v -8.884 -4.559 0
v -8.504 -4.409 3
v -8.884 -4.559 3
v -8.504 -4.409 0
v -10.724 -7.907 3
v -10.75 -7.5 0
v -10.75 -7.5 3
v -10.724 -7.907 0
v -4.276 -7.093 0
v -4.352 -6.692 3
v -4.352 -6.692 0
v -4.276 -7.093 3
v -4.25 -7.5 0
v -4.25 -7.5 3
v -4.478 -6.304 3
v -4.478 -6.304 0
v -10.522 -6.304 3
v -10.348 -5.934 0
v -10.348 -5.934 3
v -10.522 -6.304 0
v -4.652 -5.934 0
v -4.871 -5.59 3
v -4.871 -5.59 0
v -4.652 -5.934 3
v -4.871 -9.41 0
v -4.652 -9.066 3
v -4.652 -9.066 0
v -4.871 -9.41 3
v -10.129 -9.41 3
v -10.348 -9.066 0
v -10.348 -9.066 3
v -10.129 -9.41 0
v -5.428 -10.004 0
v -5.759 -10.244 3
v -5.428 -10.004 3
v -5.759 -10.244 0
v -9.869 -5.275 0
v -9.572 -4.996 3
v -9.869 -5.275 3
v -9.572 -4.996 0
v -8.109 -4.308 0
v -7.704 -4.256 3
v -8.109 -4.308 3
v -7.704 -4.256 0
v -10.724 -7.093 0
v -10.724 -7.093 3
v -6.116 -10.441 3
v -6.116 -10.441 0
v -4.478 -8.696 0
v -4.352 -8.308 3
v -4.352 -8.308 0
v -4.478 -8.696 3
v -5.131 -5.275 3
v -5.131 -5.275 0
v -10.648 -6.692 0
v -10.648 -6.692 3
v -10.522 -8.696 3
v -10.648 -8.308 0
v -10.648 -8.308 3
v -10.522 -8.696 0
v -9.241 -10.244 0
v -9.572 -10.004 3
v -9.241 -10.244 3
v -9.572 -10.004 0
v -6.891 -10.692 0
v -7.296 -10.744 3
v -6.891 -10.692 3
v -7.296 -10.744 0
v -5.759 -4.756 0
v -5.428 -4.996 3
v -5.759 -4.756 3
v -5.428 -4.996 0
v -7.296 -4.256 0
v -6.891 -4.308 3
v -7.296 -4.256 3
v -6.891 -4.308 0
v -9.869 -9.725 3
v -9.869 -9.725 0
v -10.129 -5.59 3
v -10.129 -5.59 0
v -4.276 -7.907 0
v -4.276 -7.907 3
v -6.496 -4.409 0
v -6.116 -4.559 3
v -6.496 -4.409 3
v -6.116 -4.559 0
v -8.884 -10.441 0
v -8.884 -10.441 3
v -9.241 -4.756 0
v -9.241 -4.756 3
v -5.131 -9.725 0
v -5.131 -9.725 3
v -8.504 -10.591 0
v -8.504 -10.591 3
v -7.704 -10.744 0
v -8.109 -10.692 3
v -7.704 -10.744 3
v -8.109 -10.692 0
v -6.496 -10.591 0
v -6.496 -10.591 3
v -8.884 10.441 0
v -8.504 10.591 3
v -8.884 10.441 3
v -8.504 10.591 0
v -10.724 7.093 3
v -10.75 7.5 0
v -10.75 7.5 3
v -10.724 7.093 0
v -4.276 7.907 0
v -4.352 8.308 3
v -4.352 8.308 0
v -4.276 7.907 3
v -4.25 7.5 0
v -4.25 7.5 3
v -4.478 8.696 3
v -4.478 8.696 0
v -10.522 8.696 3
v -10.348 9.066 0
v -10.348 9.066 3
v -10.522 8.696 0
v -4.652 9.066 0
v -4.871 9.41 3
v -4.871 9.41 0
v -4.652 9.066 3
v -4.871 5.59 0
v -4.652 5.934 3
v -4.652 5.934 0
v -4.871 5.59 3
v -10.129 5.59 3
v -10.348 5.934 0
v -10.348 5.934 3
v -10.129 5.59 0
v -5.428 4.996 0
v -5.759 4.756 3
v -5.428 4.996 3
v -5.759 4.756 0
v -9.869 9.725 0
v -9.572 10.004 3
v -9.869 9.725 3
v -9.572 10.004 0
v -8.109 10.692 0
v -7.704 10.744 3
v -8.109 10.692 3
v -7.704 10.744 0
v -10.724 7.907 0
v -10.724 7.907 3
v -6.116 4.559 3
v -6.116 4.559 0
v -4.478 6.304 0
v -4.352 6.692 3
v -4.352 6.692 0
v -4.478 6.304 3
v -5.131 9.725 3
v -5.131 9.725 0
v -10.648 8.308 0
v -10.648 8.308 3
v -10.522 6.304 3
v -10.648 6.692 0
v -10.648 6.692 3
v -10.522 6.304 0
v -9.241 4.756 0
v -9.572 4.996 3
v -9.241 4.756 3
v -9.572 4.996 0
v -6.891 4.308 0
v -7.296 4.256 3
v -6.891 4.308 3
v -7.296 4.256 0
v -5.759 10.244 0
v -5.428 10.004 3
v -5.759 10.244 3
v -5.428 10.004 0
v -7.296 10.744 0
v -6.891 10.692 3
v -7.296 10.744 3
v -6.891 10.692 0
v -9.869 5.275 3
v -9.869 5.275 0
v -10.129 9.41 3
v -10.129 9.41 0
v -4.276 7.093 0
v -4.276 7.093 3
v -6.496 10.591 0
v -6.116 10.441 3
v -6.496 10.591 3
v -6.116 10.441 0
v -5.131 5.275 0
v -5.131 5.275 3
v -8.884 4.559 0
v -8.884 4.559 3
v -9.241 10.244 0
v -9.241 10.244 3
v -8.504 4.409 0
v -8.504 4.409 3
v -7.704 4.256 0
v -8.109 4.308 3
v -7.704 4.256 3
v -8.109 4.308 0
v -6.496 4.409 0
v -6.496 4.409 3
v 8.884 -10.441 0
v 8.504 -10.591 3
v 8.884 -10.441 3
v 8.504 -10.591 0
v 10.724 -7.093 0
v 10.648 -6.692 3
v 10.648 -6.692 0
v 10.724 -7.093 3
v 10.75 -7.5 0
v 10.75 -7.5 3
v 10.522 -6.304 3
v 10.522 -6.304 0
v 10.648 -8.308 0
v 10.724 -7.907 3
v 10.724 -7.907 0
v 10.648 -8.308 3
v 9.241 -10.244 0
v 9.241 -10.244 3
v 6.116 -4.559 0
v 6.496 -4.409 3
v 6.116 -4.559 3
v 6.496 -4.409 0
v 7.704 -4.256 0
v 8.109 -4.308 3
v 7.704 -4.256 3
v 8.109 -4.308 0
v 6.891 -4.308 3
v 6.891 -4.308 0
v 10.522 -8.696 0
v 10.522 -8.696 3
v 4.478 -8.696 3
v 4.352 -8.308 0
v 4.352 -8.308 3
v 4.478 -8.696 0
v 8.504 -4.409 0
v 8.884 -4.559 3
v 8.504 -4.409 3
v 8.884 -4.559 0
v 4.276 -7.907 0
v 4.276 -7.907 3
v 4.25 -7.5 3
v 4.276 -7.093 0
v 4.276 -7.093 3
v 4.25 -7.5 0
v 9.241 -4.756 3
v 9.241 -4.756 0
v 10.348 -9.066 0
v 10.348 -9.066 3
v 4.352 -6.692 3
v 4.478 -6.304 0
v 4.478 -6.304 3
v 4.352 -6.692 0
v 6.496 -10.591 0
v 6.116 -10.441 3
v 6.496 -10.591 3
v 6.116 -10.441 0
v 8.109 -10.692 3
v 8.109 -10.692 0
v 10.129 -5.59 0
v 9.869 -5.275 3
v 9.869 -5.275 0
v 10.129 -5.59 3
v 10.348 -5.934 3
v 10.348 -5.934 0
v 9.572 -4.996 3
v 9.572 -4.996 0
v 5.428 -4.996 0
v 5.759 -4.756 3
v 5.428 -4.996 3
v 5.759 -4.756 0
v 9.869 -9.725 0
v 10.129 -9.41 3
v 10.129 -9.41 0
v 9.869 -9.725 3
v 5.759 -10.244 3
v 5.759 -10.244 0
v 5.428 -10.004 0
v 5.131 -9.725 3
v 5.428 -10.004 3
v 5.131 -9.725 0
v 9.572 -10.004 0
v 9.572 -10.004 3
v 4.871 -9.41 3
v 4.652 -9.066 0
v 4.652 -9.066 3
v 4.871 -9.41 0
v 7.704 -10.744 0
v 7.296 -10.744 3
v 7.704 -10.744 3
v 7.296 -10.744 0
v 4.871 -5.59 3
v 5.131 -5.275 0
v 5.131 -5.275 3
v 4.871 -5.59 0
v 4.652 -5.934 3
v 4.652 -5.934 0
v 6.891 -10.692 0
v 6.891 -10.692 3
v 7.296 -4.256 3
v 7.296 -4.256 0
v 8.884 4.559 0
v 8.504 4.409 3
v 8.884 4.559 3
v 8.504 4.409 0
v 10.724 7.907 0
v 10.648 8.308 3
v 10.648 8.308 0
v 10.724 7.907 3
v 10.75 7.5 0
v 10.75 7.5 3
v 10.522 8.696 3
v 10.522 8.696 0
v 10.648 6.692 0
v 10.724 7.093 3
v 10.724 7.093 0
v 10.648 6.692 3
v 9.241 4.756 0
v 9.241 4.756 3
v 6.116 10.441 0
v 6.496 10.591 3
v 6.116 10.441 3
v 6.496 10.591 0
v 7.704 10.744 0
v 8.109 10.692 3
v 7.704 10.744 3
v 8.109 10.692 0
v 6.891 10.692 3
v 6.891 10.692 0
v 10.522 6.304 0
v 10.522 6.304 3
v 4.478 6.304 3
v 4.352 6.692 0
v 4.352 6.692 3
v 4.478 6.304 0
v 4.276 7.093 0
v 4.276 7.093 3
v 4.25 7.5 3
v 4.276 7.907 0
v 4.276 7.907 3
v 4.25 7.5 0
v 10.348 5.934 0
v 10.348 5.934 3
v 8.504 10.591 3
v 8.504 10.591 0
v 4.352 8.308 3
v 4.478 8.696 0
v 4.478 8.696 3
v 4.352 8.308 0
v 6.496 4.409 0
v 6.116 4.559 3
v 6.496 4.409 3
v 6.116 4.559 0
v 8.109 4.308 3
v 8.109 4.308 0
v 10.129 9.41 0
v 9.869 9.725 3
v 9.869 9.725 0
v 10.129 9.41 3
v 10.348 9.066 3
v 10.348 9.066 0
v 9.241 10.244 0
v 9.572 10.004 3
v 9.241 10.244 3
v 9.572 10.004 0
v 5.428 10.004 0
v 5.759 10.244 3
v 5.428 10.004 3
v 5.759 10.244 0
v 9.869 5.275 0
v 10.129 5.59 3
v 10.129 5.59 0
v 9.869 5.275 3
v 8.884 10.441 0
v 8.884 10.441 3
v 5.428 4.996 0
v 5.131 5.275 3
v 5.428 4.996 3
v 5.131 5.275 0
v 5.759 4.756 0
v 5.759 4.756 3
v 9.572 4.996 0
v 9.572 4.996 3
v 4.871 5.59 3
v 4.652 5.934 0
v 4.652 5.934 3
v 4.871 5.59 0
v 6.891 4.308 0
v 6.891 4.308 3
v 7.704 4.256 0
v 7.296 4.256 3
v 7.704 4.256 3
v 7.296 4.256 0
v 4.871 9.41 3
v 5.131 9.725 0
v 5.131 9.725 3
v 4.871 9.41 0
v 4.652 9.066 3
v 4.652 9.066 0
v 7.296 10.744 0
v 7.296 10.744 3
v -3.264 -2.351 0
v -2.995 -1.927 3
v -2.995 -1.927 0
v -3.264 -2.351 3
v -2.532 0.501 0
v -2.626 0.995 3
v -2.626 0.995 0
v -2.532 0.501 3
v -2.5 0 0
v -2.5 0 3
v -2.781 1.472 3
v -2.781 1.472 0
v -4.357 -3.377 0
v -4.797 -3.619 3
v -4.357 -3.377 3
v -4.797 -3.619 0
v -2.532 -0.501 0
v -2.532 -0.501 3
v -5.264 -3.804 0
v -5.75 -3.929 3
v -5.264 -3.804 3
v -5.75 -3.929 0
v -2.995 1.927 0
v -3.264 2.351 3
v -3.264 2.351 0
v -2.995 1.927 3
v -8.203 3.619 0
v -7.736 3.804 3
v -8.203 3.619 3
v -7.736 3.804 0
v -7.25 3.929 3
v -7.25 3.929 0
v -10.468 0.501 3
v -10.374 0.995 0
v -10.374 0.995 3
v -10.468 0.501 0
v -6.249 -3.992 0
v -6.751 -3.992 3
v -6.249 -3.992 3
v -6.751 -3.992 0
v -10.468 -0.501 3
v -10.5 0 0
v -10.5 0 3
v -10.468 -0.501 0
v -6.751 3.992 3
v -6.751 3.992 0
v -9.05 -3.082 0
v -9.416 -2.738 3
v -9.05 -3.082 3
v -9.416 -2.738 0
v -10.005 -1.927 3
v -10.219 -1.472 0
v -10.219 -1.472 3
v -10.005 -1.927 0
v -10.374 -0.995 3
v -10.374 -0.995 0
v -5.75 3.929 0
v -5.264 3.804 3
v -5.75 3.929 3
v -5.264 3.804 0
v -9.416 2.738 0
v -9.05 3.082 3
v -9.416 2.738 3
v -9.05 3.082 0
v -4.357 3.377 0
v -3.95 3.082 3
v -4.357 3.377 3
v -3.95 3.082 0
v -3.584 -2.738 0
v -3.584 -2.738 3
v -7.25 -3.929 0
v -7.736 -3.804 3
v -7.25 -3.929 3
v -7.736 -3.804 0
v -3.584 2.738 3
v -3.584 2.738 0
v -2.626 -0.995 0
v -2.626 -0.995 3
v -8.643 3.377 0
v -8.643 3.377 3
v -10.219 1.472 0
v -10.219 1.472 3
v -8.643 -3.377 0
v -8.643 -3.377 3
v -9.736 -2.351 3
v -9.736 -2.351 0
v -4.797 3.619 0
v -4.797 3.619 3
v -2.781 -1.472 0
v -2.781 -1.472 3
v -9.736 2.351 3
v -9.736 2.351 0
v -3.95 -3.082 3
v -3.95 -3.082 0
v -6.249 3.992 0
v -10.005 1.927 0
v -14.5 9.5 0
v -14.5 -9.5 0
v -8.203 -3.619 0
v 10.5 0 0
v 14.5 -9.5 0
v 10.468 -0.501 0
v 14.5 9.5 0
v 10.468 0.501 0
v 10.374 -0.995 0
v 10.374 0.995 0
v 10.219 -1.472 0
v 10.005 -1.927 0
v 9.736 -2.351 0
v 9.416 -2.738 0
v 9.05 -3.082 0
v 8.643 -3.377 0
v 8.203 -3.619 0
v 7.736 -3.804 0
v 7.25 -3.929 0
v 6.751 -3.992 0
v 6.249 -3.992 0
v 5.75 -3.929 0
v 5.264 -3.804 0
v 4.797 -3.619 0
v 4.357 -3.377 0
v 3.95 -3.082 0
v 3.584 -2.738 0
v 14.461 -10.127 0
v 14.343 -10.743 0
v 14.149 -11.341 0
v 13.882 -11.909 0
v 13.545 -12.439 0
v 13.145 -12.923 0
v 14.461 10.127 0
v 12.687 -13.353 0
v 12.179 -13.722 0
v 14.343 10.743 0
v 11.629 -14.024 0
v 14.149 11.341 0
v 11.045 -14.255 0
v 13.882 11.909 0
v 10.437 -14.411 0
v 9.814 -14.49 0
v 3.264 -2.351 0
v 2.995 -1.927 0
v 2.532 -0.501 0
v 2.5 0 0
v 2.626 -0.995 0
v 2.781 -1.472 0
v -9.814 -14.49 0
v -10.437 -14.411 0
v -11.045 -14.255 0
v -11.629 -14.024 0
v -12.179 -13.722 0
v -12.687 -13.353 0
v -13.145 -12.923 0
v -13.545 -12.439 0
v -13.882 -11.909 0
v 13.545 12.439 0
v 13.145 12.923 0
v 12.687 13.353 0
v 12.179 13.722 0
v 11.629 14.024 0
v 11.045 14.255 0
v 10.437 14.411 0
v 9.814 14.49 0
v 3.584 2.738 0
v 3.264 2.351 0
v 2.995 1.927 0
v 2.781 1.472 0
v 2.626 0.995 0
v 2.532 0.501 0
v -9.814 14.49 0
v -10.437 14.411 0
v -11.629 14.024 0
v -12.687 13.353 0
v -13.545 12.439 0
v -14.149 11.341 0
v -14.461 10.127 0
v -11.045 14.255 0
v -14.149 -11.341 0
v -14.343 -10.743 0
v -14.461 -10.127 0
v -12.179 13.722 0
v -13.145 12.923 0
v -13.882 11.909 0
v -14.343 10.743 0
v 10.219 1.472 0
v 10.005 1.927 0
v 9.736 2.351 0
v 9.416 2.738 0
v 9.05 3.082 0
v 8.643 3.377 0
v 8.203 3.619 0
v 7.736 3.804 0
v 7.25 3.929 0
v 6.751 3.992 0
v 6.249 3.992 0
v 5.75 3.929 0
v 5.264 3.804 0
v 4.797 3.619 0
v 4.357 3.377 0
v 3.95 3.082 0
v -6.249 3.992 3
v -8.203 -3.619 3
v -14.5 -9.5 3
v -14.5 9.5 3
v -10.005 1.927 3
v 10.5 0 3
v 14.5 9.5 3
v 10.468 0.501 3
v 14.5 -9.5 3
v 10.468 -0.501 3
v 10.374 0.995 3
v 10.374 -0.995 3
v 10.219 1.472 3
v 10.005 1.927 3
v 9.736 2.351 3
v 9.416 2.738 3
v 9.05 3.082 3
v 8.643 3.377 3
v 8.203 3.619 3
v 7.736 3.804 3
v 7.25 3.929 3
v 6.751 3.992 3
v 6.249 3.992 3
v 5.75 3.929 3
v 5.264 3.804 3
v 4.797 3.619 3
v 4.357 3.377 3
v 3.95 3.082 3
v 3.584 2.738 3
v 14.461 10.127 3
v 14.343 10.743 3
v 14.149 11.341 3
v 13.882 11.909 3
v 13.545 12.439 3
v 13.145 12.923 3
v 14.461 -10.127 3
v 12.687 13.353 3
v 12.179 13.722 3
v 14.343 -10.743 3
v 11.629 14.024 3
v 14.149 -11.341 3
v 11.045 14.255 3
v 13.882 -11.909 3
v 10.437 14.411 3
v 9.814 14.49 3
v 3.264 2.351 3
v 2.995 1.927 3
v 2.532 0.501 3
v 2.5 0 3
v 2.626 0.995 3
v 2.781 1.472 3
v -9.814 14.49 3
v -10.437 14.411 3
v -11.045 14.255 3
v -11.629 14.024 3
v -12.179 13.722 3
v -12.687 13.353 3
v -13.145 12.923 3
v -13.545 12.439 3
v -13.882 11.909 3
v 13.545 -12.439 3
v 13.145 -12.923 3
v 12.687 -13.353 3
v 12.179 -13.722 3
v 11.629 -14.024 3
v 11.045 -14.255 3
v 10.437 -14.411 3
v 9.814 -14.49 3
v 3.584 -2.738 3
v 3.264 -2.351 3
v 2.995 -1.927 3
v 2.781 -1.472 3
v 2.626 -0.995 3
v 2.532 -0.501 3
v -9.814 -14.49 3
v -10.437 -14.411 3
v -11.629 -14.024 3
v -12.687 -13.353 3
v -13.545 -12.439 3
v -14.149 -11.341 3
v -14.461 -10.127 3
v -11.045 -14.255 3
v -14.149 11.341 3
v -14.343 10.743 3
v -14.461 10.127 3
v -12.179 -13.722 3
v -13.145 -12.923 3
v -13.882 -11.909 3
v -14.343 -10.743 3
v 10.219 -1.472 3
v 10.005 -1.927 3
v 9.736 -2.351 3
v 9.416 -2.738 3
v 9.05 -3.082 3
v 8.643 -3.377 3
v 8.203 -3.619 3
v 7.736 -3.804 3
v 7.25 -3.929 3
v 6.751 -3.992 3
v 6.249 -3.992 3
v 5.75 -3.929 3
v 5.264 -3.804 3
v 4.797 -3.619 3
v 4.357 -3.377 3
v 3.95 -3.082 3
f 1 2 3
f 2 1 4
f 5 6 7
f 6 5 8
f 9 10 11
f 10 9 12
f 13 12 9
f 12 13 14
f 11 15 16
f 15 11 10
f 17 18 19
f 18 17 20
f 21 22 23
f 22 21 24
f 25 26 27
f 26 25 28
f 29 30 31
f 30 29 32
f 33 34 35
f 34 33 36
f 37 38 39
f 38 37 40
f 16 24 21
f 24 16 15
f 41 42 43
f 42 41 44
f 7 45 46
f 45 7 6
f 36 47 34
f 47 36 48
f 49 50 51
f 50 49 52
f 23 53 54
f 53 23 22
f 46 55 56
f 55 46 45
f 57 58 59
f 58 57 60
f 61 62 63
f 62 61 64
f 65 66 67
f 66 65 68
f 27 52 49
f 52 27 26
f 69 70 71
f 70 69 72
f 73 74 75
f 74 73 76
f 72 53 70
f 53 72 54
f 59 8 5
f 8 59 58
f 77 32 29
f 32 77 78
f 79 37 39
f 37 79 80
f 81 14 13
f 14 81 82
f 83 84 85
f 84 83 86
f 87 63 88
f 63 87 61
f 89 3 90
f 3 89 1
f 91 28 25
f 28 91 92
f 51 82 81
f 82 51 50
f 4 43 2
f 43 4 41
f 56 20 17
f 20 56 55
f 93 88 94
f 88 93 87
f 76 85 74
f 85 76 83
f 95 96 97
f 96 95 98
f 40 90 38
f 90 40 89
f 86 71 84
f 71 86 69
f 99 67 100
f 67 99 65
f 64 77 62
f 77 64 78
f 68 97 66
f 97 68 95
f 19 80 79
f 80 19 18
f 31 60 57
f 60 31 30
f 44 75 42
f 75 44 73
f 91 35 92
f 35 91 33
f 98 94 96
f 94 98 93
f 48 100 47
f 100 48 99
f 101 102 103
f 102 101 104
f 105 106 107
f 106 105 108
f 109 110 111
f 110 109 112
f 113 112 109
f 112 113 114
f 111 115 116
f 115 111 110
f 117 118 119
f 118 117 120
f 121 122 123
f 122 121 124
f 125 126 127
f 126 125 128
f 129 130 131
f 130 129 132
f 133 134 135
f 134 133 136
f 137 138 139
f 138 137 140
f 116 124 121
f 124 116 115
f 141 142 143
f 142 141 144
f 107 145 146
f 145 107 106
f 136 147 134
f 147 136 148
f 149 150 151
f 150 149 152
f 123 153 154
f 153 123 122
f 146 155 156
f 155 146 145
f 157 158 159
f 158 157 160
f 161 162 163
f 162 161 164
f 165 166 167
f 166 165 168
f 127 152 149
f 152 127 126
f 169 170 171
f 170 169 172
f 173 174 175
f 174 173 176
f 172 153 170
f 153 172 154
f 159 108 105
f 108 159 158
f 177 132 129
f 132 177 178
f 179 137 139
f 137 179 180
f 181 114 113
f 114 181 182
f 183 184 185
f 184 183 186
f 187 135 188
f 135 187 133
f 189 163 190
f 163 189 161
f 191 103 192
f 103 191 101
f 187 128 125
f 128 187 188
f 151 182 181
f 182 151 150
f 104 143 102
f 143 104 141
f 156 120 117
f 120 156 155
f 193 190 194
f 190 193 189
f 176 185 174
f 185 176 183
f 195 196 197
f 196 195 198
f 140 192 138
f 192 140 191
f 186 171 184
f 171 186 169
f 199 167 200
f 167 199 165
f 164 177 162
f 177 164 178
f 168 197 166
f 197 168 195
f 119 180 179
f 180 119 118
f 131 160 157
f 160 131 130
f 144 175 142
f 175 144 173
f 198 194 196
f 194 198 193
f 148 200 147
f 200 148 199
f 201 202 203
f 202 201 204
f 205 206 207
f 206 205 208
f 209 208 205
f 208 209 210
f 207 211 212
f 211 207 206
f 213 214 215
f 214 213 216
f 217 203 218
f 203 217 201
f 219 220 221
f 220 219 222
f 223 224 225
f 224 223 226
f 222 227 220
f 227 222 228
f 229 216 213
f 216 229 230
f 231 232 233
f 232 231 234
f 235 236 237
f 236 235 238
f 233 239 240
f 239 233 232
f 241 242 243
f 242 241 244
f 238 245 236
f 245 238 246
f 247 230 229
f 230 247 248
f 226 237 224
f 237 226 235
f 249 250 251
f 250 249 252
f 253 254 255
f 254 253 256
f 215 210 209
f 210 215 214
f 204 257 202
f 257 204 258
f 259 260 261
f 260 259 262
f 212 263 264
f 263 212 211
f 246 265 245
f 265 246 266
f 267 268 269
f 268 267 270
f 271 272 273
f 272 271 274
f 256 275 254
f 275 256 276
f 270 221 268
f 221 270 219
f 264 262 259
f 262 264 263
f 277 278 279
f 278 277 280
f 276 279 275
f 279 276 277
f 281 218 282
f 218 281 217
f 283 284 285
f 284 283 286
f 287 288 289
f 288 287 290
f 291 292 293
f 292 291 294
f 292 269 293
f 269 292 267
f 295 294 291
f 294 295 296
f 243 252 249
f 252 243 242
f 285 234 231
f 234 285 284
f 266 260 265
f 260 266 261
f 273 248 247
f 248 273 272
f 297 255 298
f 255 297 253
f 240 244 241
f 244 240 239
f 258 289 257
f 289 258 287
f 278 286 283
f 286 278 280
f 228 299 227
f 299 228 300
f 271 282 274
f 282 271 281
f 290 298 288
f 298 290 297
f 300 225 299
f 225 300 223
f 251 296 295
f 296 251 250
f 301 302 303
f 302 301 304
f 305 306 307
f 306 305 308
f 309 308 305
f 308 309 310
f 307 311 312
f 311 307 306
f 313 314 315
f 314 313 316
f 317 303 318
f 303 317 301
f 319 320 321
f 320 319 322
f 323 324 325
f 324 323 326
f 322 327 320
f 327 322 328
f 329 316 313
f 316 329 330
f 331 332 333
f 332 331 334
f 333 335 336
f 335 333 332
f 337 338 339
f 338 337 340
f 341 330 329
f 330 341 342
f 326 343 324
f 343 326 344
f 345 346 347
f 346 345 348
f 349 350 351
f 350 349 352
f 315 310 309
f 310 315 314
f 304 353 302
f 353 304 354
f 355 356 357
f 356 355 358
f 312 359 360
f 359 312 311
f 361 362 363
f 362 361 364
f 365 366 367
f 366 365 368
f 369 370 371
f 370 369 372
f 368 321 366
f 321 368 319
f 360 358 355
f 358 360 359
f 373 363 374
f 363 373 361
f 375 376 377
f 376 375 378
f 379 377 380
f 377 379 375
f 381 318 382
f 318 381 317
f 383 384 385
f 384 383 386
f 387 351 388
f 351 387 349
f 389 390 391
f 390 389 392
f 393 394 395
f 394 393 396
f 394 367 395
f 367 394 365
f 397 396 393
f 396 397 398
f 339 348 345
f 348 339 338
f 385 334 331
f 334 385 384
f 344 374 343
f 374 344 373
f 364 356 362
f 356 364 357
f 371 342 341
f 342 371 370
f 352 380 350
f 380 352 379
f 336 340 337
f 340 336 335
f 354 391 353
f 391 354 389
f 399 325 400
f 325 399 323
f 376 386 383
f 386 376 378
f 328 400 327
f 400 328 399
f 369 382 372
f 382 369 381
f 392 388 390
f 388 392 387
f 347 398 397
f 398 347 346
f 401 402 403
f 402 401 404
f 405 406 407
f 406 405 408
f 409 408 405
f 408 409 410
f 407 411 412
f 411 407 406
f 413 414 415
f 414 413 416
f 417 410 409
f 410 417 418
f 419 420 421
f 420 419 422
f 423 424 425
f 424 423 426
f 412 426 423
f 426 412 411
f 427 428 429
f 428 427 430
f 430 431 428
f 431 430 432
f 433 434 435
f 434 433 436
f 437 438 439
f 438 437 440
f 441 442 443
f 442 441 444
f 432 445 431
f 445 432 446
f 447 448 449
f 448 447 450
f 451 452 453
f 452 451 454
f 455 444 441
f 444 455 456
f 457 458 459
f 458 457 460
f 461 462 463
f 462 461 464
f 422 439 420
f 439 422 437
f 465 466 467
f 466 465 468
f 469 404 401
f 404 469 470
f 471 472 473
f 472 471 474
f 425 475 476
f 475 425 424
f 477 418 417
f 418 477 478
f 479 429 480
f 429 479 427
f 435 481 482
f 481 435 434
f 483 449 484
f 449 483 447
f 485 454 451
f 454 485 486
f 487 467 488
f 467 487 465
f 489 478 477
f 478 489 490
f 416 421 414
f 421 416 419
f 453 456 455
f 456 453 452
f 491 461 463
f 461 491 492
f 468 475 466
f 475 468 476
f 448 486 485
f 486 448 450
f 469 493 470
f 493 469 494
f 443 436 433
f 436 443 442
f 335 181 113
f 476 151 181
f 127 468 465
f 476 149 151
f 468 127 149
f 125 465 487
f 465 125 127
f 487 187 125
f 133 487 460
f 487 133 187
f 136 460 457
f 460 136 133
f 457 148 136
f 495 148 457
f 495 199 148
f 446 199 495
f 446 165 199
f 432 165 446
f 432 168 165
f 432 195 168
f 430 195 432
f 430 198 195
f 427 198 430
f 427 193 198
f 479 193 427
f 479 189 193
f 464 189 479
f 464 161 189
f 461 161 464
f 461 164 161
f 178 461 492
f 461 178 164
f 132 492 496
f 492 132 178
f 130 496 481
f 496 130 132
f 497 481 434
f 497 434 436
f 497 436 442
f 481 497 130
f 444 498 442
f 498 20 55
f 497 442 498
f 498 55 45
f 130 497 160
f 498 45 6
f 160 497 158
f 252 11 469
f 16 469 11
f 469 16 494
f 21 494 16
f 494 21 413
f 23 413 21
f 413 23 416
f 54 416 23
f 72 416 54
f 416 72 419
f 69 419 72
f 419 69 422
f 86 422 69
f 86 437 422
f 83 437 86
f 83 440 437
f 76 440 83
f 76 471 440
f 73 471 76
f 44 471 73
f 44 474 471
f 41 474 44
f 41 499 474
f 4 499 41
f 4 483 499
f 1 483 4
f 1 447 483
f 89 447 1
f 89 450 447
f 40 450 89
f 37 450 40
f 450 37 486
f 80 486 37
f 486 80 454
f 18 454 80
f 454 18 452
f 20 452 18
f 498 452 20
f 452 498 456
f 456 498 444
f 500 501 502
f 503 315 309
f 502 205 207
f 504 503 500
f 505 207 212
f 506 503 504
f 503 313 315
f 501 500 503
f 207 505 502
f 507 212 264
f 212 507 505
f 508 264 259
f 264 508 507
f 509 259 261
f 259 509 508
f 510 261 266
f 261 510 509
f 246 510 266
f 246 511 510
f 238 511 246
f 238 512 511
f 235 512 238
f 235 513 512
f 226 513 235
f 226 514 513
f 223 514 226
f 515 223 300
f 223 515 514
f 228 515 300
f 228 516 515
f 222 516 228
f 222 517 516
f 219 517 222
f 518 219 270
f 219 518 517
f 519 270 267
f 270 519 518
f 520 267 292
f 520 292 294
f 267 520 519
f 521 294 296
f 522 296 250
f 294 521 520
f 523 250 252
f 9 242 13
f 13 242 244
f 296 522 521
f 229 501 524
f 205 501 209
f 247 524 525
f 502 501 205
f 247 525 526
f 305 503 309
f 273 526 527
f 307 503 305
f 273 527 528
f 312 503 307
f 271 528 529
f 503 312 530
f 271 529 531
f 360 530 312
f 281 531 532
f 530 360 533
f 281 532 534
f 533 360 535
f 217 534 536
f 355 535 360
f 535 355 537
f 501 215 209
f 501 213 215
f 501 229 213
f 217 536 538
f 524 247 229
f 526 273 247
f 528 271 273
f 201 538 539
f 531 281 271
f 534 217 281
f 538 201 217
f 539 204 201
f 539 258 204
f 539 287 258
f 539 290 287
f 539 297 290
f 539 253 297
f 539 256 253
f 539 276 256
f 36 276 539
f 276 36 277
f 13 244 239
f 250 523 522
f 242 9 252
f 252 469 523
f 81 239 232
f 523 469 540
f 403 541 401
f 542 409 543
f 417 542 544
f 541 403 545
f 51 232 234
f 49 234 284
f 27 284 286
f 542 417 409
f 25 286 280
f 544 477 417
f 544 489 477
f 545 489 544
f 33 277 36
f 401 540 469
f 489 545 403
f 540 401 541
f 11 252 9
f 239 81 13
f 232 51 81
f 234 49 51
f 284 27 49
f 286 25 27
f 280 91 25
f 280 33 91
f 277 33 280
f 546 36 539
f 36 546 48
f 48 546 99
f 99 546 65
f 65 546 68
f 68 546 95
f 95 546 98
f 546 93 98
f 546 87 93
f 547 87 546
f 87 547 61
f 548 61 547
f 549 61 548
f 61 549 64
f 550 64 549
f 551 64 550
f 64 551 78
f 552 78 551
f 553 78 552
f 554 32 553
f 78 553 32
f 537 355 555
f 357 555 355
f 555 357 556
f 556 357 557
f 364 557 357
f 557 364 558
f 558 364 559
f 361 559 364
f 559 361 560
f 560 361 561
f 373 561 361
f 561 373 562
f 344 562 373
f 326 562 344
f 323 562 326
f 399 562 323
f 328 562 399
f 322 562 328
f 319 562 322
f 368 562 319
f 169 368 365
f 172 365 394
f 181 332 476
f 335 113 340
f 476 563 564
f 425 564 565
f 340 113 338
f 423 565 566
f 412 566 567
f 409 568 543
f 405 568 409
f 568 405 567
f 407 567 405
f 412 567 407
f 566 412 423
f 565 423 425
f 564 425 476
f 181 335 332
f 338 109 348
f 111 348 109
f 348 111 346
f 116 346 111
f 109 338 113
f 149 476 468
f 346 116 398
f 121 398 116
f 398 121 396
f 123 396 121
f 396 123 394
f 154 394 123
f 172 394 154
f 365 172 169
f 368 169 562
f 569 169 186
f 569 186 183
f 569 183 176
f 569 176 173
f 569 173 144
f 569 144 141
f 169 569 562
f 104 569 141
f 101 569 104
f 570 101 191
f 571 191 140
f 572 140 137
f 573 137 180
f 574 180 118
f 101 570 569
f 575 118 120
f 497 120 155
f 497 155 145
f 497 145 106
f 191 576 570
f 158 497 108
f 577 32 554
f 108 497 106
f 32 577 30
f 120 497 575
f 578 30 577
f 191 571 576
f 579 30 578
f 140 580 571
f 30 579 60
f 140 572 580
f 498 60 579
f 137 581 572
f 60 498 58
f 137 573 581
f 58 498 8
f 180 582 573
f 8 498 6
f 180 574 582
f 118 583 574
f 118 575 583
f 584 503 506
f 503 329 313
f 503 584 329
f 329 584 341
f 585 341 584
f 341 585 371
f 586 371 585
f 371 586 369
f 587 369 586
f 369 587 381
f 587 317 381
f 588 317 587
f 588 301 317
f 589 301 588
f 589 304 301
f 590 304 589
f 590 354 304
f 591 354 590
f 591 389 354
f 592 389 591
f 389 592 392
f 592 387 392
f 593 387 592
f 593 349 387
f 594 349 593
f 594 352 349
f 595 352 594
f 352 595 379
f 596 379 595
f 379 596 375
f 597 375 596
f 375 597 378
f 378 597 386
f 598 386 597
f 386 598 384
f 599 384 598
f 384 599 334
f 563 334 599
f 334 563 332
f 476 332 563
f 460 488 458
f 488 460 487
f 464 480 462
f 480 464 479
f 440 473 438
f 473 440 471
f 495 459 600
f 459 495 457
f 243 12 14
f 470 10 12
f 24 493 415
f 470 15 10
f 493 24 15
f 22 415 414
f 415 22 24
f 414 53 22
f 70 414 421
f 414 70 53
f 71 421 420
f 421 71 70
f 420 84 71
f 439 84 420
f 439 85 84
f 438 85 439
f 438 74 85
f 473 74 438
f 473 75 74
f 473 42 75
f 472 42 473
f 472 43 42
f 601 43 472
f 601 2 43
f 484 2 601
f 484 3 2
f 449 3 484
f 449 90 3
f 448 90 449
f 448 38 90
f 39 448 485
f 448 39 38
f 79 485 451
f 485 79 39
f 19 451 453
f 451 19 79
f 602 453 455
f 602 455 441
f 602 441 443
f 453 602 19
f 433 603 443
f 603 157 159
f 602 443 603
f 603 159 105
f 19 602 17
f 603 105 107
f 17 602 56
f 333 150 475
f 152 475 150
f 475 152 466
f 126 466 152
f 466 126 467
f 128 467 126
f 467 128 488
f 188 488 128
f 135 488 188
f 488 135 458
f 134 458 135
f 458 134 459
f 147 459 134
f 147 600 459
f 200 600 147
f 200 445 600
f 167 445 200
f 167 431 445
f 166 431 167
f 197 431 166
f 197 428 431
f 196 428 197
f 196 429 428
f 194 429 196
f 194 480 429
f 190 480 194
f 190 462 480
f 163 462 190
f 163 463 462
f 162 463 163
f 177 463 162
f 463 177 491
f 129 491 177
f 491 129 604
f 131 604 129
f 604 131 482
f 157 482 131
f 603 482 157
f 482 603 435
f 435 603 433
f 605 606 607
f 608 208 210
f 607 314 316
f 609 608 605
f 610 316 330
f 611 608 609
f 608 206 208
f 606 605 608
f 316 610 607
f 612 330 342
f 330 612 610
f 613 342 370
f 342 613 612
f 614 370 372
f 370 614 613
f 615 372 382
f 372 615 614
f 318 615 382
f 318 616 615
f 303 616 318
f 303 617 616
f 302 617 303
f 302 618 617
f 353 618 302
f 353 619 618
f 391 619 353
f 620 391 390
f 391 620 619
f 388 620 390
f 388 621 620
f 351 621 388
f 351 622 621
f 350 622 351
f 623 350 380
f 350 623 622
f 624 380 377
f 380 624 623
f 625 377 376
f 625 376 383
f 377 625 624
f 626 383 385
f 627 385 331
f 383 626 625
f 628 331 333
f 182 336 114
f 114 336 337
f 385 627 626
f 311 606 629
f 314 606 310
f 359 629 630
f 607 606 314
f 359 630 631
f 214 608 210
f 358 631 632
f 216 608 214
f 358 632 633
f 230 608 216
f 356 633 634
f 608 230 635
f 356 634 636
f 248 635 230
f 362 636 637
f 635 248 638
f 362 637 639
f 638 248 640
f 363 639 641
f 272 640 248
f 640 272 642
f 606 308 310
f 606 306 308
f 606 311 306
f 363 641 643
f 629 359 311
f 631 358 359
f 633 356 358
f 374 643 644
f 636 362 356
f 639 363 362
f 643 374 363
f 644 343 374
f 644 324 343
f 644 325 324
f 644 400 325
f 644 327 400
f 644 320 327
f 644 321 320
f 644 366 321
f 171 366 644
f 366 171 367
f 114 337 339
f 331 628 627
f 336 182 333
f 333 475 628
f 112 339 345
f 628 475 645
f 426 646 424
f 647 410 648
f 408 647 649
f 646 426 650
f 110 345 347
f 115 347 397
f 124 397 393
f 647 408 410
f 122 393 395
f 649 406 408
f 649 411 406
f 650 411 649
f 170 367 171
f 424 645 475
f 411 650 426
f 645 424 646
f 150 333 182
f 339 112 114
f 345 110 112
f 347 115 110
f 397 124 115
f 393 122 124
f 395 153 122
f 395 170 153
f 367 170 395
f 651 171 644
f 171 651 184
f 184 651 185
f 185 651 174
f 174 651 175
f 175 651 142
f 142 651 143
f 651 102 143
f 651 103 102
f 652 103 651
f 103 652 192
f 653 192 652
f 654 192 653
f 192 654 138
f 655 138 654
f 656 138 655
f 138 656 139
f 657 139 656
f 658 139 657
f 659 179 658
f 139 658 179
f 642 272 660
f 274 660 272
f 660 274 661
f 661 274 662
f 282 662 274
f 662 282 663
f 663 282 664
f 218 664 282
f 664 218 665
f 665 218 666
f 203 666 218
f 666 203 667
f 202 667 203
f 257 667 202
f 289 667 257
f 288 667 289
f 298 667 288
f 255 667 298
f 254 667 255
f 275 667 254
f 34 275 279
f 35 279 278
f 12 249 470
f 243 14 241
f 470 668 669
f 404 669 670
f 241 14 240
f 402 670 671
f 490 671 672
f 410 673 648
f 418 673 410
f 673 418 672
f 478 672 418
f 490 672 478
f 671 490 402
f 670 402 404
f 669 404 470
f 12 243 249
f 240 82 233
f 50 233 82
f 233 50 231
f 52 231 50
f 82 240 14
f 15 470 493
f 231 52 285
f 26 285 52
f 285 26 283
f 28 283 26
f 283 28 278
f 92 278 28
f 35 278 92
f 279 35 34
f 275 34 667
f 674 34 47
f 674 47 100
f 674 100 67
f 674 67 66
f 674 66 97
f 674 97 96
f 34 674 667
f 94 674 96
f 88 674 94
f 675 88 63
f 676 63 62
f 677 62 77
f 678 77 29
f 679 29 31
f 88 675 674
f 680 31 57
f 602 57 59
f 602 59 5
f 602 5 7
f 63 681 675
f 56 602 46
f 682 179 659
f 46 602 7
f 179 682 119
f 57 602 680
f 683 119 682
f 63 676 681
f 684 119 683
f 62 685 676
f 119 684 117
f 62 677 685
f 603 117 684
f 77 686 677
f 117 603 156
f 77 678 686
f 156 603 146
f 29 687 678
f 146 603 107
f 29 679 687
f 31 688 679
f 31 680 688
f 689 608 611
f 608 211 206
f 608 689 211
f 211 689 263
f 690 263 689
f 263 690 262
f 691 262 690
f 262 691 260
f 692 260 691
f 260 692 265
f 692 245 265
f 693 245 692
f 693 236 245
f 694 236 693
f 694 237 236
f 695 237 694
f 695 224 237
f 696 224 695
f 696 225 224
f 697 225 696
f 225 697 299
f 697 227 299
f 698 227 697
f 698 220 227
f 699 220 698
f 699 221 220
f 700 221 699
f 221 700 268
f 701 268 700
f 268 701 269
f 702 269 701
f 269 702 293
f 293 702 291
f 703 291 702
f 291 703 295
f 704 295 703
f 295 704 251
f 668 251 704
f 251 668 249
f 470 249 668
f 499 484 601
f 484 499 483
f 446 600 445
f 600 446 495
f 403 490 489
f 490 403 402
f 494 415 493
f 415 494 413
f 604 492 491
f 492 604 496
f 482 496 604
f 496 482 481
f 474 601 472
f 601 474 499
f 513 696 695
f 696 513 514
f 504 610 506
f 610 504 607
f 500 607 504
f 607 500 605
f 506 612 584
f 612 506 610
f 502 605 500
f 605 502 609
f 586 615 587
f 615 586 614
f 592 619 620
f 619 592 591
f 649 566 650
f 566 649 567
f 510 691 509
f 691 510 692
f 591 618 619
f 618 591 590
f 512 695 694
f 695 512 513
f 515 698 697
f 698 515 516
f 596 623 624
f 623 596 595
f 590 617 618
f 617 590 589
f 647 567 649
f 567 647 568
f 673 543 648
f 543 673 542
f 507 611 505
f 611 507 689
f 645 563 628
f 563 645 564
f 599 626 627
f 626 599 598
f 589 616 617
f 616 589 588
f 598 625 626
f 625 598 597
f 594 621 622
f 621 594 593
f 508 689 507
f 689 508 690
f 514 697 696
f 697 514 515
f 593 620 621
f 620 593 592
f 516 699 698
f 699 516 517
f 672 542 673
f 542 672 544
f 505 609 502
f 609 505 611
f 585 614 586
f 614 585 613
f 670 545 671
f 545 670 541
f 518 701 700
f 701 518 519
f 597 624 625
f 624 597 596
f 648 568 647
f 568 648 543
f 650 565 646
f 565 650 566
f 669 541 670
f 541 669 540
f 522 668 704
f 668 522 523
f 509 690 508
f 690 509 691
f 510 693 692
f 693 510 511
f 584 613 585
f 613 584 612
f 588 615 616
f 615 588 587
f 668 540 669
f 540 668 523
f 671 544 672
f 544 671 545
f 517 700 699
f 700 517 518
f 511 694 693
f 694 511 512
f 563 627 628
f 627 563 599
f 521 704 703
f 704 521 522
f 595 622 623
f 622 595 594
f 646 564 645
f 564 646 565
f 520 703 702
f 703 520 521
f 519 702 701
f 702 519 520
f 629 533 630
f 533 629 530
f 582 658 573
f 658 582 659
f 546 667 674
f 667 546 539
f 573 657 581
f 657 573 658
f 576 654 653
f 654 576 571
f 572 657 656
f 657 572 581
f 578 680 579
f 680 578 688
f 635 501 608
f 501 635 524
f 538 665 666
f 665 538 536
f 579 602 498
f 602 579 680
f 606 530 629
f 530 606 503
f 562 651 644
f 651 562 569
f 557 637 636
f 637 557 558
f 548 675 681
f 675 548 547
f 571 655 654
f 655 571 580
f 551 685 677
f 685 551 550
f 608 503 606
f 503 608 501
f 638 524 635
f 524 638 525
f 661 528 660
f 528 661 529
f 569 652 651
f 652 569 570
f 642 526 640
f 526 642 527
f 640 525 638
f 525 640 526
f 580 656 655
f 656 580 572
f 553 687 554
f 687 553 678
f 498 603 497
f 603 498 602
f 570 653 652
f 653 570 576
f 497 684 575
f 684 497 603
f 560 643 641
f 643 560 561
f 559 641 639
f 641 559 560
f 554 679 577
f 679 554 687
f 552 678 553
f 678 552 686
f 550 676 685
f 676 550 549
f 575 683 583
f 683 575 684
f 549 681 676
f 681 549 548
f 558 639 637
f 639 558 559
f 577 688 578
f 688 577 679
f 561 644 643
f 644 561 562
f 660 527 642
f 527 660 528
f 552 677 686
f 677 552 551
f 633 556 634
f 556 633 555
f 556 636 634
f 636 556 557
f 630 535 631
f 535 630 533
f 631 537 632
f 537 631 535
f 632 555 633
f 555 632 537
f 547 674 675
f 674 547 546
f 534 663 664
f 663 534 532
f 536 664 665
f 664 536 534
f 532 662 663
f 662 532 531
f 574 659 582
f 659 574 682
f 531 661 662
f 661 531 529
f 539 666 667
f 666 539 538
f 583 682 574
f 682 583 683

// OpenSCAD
$fn = 50;


difference() {
	union() {
		hull() {
			translate(v = [-9.5000000000, 9.5000000000, 0]) {
				cylinder(h = 3, r = 5);
			}
			translate(v = [9.5000000000, 9.5000000000, 0]) {
				cylinder(h = 3, r = 5);
			}
			translate(v = [-9.5000000000, -9.5000000000, 0]) {
				cylinder(h = 3, r = 5);
			}
			translate(v = [9.5000000000, -9.5000000000, 0]) {
				cylinder(h = 3, r = 5);
			}
		}
	}
	union() {
		#translate(v = [-7.5000000000, -7.5000000000, -100.0000000000]) {
			cylinder(h = 200, r = 3.2500000000);
		}
		#translate(v = [-7.5000000000, 7.5000000000, -100.0000000000]) {
			cylinder(h = 200, r = 3.2500000000);
		}
		#translate(v = [7.5000000000, -7.5000000000, -100.0000000000]) {
			cylinder(h = 200, r = 3.2500000000);
		}
		#translate(v = [7.5000000000, 7.5000000000, -100.0000000000]) {
			cylinder(h = 200, r = 3.2500000000);
		}
		#translate(v = [-6.5000000000, 0, 0]) {
			cylinder(h = 3, r = 4.0000000000);
		}
		#translate(v = [6.5000000000, 0, 0]) {
			cylinder(h = 3, r = 4.0000000000);
		}
	}
}
